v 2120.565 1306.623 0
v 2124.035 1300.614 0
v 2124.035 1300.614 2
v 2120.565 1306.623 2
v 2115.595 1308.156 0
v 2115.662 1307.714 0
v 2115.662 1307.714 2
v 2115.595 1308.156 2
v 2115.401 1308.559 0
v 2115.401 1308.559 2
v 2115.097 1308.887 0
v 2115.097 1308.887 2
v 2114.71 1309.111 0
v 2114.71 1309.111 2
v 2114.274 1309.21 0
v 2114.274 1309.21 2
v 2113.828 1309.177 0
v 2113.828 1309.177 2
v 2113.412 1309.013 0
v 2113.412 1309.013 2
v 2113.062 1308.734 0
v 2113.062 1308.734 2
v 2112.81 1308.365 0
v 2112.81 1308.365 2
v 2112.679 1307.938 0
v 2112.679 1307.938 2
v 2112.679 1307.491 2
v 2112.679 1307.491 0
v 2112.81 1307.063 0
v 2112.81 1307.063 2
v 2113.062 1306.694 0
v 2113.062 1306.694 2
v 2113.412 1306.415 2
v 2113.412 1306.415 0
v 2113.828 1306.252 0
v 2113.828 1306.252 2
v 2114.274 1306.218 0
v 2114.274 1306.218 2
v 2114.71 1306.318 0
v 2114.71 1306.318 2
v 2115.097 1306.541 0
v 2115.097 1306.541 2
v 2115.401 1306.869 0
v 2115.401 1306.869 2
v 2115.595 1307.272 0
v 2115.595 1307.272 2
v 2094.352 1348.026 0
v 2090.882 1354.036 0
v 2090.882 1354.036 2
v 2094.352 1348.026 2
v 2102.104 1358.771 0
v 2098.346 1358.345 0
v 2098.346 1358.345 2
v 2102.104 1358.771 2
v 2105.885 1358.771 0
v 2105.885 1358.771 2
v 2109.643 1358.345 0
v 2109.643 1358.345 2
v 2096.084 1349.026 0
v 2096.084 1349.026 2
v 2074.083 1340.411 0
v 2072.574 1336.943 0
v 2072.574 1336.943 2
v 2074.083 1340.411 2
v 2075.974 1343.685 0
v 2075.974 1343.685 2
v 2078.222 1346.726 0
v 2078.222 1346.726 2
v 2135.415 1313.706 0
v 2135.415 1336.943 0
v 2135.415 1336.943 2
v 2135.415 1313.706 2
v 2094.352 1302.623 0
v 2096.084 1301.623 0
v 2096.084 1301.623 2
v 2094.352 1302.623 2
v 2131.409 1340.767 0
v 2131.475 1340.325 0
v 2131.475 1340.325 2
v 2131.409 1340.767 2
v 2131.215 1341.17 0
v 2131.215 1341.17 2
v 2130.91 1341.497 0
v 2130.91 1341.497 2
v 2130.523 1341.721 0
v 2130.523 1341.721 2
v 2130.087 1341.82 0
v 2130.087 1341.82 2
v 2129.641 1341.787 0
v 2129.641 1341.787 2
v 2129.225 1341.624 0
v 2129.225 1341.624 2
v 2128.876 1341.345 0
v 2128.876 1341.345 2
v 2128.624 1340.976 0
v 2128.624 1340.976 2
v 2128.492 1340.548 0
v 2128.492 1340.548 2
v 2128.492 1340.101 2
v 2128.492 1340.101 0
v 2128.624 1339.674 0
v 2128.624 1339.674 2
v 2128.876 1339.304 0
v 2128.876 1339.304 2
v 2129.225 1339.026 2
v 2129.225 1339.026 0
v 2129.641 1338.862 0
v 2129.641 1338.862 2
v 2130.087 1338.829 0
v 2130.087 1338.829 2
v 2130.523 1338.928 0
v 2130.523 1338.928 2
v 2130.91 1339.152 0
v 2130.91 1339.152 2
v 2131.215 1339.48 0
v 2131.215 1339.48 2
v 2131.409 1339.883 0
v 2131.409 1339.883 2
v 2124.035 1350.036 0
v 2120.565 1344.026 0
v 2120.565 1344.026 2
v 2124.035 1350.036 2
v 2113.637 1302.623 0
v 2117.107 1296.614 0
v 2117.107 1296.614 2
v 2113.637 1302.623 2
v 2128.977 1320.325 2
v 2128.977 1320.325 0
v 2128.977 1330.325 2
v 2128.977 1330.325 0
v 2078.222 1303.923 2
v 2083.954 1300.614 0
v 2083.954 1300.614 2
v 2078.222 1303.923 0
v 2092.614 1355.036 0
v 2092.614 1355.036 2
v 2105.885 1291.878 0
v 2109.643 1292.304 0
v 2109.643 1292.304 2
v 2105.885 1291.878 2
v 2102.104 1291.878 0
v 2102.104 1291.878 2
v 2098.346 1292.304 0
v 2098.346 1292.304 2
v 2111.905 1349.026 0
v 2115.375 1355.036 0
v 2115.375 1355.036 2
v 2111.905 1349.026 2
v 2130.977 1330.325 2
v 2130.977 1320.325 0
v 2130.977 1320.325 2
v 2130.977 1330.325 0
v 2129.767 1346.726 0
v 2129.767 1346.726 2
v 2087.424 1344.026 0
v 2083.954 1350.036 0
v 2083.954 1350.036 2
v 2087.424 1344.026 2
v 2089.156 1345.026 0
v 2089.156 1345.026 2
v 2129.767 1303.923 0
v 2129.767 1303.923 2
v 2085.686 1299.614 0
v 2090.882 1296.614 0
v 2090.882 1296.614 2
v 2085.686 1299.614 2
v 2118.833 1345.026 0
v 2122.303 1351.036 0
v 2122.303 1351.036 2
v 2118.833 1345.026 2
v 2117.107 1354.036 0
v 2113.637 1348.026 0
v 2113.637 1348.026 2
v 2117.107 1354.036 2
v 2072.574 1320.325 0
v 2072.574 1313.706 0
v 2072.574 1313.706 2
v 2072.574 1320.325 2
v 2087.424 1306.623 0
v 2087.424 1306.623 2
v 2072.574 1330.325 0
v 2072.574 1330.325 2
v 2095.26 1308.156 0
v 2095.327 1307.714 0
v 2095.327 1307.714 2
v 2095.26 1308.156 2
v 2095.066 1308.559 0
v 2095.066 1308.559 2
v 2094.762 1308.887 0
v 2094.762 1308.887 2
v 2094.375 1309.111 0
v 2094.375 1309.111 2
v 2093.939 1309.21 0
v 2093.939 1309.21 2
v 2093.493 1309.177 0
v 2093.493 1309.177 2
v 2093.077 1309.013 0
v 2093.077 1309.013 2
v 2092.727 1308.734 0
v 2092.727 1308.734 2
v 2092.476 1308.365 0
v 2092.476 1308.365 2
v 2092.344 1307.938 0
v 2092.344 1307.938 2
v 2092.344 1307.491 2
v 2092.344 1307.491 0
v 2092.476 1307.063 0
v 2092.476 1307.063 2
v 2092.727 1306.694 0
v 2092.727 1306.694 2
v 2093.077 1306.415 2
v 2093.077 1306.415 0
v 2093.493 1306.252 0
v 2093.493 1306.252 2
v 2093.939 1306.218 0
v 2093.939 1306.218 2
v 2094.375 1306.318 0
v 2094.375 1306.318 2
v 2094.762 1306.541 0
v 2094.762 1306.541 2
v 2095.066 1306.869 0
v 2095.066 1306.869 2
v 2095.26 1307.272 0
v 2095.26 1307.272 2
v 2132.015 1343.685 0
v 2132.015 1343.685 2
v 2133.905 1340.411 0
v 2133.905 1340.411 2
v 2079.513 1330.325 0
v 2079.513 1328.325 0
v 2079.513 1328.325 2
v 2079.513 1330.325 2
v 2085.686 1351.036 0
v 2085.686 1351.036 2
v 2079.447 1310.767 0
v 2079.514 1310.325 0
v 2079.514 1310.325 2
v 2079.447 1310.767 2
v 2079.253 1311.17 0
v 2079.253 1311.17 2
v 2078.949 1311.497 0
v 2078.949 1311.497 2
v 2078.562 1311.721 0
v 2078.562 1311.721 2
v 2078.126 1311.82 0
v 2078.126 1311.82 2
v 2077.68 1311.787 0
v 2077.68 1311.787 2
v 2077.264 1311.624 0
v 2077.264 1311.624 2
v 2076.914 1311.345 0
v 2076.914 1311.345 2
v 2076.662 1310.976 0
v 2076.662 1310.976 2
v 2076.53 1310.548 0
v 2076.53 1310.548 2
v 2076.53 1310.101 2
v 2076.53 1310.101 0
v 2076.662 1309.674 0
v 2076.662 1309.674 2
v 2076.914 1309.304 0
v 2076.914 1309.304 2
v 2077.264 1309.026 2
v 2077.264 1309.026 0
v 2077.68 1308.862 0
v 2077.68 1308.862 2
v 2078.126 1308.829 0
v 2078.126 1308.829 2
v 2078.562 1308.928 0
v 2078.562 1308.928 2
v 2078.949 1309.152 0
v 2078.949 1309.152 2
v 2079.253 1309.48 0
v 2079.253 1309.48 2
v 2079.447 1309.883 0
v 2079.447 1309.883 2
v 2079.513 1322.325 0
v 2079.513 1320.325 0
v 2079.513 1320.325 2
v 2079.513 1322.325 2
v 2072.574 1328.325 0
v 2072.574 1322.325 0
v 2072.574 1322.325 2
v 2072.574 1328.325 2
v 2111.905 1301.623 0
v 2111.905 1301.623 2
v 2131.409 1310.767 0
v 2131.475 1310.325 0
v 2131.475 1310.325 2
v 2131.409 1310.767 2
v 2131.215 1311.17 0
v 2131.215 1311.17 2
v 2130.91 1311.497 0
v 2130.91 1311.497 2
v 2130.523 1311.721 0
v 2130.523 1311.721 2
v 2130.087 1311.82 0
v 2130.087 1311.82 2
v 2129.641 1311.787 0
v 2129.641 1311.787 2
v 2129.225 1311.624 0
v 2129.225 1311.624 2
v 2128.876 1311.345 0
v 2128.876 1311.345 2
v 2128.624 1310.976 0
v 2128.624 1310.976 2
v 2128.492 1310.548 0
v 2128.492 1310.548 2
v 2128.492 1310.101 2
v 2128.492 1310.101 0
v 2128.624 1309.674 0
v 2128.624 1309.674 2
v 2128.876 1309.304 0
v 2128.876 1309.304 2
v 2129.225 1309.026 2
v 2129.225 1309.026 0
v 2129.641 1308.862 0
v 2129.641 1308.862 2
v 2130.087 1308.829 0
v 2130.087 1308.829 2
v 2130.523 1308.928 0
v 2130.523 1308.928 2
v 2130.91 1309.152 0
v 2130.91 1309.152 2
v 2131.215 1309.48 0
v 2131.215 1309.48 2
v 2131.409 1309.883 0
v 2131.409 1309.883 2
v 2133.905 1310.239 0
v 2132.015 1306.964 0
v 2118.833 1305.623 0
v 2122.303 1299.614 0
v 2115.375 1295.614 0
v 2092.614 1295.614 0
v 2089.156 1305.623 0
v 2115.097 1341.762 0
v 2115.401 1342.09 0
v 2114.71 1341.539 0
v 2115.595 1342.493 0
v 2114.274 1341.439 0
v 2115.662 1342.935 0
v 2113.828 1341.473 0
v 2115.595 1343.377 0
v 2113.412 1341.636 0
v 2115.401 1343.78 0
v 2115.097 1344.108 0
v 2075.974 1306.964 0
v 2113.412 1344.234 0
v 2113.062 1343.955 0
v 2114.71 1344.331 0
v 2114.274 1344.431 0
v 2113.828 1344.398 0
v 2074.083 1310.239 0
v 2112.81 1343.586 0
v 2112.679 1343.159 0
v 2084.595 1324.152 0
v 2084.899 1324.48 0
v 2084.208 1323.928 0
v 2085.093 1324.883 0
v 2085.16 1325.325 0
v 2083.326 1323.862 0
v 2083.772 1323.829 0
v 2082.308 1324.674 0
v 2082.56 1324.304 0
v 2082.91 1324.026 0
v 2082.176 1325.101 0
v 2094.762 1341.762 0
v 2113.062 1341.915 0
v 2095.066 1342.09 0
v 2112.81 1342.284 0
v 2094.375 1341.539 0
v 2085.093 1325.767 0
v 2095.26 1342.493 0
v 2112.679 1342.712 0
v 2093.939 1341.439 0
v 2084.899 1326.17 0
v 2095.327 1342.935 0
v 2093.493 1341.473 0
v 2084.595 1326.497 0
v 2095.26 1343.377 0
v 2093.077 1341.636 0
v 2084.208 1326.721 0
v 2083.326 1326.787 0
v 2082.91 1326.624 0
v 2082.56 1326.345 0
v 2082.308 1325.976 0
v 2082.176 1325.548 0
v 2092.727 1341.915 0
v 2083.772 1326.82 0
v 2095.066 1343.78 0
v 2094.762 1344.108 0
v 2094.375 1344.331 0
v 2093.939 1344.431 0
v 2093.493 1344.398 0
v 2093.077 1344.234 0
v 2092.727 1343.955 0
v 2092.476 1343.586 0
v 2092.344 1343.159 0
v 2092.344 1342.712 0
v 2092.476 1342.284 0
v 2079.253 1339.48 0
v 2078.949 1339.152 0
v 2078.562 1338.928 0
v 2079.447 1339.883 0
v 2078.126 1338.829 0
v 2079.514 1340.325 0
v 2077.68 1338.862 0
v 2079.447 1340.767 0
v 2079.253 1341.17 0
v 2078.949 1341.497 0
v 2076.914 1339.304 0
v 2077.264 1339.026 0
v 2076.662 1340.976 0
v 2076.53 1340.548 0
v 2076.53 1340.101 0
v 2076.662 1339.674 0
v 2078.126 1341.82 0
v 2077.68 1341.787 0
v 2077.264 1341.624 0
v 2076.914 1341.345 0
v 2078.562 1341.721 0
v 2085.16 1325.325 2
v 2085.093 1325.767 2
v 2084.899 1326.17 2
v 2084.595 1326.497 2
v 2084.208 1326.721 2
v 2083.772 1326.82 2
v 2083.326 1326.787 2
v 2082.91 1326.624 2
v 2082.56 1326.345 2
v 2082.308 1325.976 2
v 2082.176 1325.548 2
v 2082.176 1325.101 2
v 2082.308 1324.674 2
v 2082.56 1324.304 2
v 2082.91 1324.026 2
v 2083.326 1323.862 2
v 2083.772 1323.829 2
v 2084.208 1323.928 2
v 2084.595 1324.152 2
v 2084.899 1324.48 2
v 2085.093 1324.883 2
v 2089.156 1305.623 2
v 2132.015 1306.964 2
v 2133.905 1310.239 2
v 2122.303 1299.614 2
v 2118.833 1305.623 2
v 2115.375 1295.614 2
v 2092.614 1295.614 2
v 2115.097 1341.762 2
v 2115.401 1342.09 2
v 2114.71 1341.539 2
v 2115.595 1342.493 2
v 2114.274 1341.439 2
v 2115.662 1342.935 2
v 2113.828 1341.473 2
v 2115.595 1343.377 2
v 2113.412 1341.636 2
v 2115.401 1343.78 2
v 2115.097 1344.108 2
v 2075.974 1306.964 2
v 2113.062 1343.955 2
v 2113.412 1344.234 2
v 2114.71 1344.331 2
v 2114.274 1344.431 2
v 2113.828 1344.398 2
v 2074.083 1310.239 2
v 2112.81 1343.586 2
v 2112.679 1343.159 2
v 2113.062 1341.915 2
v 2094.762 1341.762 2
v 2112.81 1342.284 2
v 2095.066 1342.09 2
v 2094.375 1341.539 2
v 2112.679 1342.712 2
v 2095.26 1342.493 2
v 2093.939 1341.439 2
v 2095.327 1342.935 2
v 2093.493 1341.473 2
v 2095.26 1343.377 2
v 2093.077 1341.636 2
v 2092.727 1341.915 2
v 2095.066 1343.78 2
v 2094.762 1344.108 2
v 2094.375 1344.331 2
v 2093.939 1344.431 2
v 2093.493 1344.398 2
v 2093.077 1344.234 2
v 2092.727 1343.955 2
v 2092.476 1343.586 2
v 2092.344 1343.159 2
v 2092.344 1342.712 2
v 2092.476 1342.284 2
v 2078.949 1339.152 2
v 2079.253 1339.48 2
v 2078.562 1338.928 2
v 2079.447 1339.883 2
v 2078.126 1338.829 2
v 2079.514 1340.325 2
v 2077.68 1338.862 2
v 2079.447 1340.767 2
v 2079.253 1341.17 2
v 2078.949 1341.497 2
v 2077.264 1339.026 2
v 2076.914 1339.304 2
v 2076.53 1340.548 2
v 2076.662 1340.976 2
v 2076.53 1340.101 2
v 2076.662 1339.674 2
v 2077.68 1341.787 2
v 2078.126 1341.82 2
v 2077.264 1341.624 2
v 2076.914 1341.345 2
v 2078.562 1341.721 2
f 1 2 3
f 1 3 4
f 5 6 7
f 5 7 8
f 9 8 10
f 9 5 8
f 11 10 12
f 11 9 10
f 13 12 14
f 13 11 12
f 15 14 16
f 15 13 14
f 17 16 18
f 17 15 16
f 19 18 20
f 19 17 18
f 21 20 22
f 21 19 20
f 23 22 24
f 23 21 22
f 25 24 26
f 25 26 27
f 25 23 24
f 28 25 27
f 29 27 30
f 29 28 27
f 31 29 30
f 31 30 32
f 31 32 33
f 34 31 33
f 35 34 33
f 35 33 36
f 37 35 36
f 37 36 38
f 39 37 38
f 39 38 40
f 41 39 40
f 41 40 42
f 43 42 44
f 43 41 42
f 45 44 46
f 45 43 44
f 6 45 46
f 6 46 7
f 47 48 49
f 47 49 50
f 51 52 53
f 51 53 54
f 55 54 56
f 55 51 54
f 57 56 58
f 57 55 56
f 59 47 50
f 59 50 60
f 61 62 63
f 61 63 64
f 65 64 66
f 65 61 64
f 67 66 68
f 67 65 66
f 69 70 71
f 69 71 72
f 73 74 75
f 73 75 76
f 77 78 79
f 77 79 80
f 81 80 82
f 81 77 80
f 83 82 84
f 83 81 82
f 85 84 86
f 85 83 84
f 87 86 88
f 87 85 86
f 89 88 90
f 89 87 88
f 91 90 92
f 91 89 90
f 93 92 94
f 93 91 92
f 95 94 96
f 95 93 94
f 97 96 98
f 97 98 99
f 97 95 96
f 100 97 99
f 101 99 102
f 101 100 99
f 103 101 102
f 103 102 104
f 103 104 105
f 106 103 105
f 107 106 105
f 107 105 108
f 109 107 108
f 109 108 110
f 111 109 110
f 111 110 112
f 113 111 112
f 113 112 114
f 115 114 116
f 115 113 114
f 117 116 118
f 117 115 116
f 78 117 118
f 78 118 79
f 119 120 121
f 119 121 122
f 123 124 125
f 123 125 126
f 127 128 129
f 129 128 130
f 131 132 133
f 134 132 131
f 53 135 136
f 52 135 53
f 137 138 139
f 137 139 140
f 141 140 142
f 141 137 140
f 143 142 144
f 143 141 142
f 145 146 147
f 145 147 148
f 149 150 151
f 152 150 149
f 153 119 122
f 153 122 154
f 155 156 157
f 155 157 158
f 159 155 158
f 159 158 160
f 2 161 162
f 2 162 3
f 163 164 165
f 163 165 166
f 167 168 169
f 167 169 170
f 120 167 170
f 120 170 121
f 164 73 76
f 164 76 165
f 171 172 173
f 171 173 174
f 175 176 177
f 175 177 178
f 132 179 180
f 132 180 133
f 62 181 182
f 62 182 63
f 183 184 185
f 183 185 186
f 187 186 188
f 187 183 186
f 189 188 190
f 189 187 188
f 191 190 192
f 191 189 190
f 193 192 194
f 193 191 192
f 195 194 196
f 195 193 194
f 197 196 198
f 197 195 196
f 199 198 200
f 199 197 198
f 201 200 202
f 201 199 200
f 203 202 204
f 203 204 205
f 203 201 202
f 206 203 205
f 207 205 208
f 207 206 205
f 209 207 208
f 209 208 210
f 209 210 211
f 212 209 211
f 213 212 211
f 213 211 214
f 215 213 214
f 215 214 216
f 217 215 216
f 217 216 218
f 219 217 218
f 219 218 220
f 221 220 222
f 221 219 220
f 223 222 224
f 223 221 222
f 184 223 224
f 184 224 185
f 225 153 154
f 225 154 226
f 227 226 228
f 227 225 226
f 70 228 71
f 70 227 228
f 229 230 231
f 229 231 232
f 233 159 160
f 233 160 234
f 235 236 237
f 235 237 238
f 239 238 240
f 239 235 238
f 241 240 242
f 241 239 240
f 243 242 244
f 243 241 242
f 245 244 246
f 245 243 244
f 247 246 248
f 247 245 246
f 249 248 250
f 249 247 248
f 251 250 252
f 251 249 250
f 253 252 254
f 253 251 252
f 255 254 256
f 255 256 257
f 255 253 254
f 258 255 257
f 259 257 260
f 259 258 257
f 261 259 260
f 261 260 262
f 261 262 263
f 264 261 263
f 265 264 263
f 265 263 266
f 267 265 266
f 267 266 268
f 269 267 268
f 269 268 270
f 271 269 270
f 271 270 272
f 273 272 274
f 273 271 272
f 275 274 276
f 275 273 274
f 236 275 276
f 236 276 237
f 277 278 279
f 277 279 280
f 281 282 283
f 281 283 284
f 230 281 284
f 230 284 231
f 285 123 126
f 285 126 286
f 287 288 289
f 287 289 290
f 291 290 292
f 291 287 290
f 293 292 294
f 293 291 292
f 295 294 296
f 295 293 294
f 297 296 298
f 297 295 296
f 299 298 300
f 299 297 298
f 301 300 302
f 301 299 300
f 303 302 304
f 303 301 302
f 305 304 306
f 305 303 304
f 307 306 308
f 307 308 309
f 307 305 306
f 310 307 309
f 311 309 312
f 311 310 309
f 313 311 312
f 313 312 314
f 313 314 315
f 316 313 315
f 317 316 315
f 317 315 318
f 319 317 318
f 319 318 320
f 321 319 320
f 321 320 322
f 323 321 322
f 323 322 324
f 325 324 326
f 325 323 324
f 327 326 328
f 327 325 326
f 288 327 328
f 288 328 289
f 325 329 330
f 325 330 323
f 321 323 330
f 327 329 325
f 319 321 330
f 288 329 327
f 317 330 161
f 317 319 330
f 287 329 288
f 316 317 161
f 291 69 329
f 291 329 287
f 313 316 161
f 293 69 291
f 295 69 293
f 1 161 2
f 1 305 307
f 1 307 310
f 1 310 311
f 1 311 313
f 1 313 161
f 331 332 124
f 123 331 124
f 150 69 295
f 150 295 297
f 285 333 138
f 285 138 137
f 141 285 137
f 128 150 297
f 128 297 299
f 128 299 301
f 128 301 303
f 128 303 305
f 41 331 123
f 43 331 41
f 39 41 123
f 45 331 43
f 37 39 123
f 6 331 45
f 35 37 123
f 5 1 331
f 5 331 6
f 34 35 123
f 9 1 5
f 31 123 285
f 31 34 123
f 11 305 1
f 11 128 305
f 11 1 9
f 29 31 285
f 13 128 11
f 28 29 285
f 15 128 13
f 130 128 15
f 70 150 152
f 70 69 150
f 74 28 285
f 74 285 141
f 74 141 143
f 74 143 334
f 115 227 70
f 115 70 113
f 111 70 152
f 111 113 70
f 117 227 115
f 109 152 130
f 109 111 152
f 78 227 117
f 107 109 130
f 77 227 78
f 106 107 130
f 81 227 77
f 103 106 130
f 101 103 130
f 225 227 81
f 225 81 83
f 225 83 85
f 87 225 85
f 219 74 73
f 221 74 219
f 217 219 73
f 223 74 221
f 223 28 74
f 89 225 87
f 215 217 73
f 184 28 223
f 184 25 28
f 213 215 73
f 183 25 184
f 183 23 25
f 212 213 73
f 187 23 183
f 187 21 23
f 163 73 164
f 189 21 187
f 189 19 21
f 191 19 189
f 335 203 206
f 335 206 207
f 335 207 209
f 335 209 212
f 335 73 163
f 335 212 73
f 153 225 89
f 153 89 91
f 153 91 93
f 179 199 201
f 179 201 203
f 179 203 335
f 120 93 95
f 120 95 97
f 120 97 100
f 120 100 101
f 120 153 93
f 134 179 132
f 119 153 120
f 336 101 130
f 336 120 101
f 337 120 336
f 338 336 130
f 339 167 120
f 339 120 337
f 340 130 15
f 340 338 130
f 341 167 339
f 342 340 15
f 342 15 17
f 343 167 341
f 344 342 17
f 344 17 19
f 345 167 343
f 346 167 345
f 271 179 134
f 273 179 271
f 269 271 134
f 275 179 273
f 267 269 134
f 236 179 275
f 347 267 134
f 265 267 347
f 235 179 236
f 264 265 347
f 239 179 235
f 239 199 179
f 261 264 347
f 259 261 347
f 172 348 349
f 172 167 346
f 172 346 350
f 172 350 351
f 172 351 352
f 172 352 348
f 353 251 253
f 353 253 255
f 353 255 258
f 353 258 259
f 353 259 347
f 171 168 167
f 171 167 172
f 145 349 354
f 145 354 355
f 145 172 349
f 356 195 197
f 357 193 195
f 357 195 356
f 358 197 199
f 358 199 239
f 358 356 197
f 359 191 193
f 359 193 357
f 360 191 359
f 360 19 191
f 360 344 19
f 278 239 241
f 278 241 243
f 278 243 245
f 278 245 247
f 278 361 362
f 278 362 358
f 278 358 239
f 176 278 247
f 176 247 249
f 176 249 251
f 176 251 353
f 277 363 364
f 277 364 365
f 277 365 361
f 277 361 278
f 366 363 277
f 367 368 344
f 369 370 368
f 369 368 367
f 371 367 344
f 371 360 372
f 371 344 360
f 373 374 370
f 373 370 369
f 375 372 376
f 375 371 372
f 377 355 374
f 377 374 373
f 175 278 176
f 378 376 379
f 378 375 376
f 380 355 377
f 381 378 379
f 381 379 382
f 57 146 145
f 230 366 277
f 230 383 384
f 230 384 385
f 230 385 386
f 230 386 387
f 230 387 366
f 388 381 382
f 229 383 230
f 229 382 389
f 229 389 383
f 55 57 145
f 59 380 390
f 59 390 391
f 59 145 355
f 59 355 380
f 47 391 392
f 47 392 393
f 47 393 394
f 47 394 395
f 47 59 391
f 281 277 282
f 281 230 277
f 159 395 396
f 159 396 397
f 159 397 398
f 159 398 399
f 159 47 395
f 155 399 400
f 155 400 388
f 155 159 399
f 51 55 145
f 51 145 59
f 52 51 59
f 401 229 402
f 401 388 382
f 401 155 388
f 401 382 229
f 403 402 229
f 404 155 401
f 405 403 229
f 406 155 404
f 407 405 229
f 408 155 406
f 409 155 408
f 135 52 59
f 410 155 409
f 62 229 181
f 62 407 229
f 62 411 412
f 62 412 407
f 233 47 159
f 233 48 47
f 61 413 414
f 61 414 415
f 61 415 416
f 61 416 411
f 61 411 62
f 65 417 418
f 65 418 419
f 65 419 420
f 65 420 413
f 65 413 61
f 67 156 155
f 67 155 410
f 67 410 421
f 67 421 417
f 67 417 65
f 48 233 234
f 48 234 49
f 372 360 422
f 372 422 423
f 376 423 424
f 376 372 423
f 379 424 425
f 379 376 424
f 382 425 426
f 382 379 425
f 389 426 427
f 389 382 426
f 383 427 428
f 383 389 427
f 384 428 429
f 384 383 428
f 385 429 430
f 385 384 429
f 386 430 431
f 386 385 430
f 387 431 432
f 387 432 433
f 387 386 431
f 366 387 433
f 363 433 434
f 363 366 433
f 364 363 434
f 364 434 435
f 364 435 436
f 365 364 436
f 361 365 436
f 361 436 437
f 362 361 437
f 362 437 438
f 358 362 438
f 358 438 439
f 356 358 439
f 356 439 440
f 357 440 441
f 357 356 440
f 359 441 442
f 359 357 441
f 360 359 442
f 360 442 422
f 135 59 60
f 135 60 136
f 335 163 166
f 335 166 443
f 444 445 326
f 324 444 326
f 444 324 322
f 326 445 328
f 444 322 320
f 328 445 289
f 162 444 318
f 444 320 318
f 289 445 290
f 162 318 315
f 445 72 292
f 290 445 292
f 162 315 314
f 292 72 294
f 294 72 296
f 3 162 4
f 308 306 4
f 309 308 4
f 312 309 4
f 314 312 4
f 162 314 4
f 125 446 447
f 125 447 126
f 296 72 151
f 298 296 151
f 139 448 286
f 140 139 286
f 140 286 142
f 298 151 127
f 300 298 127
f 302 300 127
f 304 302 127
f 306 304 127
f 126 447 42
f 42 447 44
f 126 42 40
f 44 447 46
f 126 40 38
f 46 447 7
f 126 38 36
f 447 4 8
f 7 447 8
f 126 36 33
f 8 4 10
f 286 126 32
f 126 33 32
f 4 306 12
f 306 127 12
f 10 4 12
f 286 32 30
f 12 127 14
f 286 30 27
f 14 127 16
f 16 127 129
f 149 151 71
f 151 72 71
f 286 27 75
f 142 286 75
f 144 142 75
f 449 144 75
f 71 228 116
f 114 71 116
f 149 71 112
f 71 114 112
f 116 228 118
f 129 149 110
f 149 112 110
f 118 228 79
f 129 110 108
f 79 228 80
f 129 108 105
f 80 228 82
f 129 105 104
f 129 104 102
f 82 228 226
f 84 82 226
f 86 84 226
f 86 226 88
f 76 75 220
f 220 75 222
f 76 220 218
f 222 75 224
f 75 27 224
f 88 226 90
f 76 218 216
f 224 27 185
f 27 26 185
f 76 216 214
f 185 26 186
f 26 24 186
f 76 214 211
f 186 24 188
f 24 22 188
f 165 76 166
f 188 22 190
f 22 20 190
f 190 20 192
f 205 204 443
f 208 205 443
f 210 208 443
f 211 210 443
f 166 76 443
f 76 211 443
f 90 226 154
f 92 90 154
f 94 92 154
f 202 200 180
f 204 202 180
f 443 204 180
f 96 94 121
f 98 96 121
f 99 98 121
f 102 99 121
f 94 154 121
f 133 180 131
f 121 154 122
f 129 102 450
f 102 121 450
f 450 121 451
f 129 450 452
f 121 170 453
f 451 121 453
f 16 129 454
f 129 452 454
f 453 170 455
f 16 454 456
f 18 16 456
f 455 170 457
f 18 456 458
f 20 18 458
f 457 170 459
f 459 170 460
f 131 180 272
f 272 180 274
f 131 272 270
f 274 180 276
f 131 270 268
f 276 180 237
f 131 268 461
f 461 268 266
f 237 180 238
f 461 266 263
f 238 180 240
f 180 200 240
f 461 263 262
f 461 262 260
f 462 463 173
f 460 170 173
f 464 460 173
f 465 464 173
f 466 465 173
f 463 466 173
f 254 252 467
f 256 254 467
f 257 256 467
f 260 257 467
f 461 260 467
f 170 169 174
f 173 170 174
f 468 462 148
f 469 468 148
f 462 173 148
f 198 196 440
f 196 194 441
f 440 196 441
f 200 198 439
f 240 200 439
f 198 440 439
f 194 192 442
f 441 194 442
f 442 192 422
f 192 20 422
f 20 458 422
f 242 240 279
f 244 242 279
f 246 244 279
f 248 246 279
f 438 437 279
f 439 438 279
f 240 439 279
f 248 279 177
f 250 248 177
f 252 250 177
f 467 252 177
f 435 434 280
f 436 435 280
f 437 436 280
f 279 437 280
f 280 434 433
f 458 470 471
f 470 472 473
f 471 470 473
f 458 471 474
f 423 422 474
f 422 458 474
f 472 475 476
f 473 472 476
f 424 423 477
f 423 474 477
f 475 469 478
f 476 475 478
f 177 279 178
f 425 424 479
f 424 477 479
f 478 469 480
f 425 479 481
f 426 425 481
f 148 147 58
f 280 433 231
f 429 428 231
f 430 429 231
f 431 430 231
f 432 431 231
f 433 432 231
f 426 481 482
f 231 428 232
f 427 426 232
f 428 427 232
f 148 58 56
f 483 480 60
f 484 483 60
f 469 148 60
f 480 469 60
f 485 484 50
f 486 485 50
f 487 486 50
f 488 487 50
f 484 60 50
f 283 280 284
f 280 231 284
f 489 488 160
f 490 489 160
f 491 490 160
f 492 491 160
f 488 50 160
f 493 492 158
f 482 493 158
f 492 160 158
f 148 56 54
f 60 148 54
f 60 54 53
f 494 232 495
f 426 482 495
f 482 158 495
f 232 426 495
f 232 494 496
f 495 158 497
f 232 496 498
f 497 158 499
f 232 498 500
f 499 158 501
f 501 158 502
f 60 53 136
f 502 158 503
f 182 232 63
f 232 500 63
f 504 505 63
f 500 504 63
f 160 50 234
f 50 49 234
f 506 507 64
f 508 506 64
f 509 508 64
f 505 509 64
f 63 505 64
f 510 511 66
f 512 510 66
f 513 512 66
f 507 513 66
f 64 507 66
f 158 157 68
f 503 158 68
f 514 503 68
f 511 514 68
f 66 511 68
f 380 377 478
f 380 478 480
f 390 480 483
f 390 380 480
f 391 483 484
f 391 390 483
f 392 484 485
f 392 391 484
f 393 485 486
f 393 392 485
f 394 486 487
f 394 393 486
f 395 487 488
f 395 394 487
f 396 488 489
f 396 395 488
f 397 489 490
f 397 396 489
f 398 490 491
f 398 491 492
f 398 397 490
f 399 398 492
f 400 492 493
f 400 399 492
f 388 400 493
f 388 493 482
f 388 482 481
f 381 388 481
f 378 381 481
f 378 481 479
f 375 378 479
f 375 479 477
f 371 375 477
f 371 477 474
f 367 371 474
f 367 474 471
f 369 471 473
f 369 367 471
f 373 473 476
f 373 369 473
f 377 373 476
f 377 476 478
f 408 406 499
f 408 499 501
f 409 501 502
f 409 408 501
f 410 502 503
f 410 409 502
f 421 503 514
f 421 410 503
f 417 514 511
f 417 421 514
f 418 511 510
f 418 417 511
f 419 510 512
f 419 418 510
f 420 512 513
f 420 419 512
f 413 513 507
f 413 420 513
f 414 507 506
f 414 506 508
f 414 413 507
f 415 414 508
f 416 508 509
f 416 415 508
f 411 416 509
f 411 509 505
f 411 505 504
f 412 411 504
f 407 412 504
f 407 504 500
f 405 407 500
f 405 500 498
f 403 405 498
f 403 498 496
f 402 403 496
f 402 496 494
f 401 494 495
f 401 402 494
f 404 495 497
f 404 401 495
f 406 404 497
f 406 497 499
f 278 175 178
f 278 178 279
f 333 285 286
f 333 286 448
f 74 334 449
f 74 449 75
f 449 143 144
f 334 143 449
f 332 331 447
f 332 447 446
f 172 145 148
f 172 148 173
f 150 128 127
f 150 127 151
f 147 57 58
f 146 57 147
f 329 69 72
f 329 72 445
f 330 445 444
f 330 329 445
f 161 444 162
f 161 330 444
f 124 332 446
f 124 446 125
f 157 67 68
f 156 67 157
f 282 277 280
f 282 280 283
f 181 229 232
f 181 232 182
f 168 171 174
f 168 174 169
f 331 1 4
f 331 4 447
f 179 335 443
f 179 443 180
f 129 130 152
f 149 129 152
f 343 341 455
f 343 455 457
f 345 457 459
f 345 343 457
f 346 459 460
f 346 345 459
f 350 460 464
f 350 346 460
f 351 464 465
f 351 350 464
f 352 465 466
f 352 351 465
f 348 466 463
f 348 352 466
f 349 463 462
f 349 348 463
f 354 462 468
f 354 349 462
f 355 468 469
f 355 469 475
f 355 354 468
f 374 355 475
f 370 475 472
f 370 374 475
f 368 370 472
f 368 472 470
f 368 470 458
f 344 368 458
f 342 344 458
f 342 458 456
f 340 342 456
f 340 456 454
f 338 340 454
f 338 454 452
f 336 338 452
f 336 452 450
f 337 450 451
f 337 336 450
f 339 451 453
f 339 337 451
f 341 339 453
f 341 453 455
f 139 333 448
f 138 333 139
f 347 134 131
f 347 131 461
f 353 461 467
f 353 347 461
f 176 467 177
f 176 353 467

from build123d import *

# Parameters (mm, degrees)
MODEL_R             = 1.5
MODEL_W             = 2
MODEL_H             = 10
BOSS_EXTRUDE2_DEPTH = 2


with BuildPart() as part:
    # Model → Boss-Extrude2 (new body)
    with BuildSketch(Plane.XY):
        with BuildLine():
            Line((2079.513177421, 1320.324687976), (2079.513177421, 1322.324687976))
            Line((2079.513177421, 1322.324687976), (2072.573837593, 1322.324687976))
            Line((2072.573837593, 1322.324687976), (2072.573837593, 1328.324687976))
            Line((2072.573837593, 1328.324687976), (2079.513177421, 1328.324687976))
            Line((2079.513177421, 1328.324687976), (2079.513177421, 1330.324687976))
            Line((2079.513177421, 1330.324687976), (2072.573837593, 1330.324687976))
            Line((2072.573837593, 1330.324687976), (2072.573837593, 1336.943408379))
            ThreePointArc((2072.573837593, 1336.943408379), (2074.982606168, 1342.074687976), (2078.222040366, 1346.726382553))
            Line((2078.222040366, 1346.726382553), (2083.954020375, 1350.035742754))
            Line((2083.954020375, 1350.035742754), (2087.423690289, 1344.026098178))
            Line((2087.423690289, 1344.026098178), (2089.155741097, 1345.026098178))
            Line((2089.155741097, 1345.026098178), (2085.686071183, 1351.035742754))
            Line((2085.686071183, 1351.035742754), (2090.882223605, 1354.035742754))
            Line((2090.882223605, 1354.035742754), (2094.351893519, 1348.026098178))
            Line((2094.351893519, 1348.026098178), (2096.083944327, 1349.026098178))
            Line((2096.083944327, 1349.026098178), (2092.614274413, 1355.035742754))
            Line((2092.614274413, 1355.035742754), (2098.346254422, 1358.345102956))
            ThreePointArc((2098.346254422, 1358.345102956), (2103.994457195, 1358.824687976), (2109.642659968, 1358.345102956))
            Line((2109.642659968, 1358.345102956), (2115.374639977, 1355.035742754))
            Line((2115.374639977, 1355.035742754), (2111.904970063, 1349.026098178))
            Line((2111.904970063, 1349.026098178), (2113.637020871, 1348.026098178))
            Line((2113.637020871, 1348.026098178), (2117.106690785, 1354.035742754))
            Line((2117.106690785, 1354.035742754), (2122.302843208, 1351.035742754))
            Line((2122.302843208, 1351.035742754), (2118.833173294, 1345.026098178))
            Line((2118.833173294, 1345.026098178), (2120.565224101, 1344.026098178))
            Line((2120.565224101, 1344.026098178), (2124.034894015, 1350.035742754))
            Line((2124.034894015, 1350.035742754), (2129.766874025, 1346.726382553))
            ThreePointArc((2129.766874025, 1346.726382553), (2133.006308222, 1342.074687976), (2135.415076798, 1336.943408379))
            Line((2135.415076798, 1336.943408379), (2135.415076798, 1313.705967573))
            ThreePointArc((2135.415076798, 1313.705967573), (2133.006308222, 1308.574687976), (2129.766874025, 1303.922993399))
            Line((2129.766874025, 1303.922993399), (2124.034894015, 1300.613633198))
            Line((2124.034894015, 1300.613633198), (2120.565224101, 1306.623277774))
            Line((2120.565224101, 1306.623277774), (2118.833173294, 1305.623277774))
            Line((2118.833173294, 1305.623277774), (2122.302843208, 1299.613633198))
            Line((2122.302843208, 1299.613633198), (2117.106690785, 1296.613633198))
            Line((2117.106690785, 1296.613633198), (2113.637020871, 1302.623277774))
            Line((2113.637020871, 1302.623277774), (2111.904970063, 1301.623277774))
            Line((2111.904970063, 1301.623277774), (2115.374639977, 1295.613633198))
            Line((2115.374639977, 1295.613633198), (2109.642659968, 1292.304272996))
            ThreePointArc((2109.642659968, 1292.304272996), (2103.994457195, 1291.824687976), (2098.346254422, 1292.304272996))
            Line((2098.346254422, 1292.304272996), (2092.614274413, 1295.613633198))
            Line((2092.614274413, 1295.613633198), (2096.083944327, 1301.623277774))
            Line((2096.083944327, 1301.623277774), (2094.351893519, 1302.623277774))
            Line((2094.351893519, 1302.623277774), (2090.882223605, 1296.613633198))
            Line((2090.882223605, 1296.613633198), (2085.686071183, 1299.613633198))
            Line((2085.686071183, 1299.613633198), (2089.155741097, 1305.623277774))
            Line((2089.155741097, 1305.623277774), (2087.423690289, 1306.623277774))
            Line((2087.423690289, 1306.623277774), (2083.954020375, 1300.613633198))
            Line((2083.954020375, 1300.613633198), (2078.222040366, 1303.922993399))
            ThreePointArc((2078.222040366, 1303.922993399), (2074.982606168, 1308.574687976), (2072.573837593, 1313.705967573))
            Line((2072.573837593, 1313.705967573), (2072.573837593, 1320.324687976))
            Line((2072.573837593, 1320.324687976), (2079.513177421, 1320.324687976))
        make_face()
        with Locations((2083.65962403, 1325.324687976)):
            Circle(MODEL_R, mode=Mode.SUBTRACT)
        with Locations((2093.827040613, 1342.935170078)):
            Circle(MODEL_R, mode=Mode.SUBTRACT)
        with Locations((2093.827040613, 1307.714205874)):
            Circle(MODEL_R, mode=Mode.SUBTRACT)
        with Locations((2114.161873777, 1307.714205874)):
            Circle(MODEL_R, mode=Mode.SUBTRACT)
        with Locations((2114.161873777, 1342.935170078)):
            Circle(MODEL_R, mode=Mode.SUBTRACT)
        with Locations((2078.013695082, 1340.324687976)):
            Circle(MODEL_R, mode=Mode.SUBTRACT)
        with Locations((2078.013695082, 1310.324687976)):
            Circle(MODEL_R, mode=Mode.SUBTRACT)
        with Locations((2129.975219309, 1340.324687976)):
            Circle(MODEL_R, mode=Mode.SUBTRACT)
        with Locations((2129.975219309, 1310.324687976)):
            Circle(MODEL_R, mode=Mode.SUBTRACT)
        with Locations((2129.976886457, 1325.324687976)):
            Rectangle(MODEL_W, MODEL_H, mode=Mode.SUBTRACT)
    extrude(amount=BOSS_EXTRUDE2_DEPTH)


solid = part.part
